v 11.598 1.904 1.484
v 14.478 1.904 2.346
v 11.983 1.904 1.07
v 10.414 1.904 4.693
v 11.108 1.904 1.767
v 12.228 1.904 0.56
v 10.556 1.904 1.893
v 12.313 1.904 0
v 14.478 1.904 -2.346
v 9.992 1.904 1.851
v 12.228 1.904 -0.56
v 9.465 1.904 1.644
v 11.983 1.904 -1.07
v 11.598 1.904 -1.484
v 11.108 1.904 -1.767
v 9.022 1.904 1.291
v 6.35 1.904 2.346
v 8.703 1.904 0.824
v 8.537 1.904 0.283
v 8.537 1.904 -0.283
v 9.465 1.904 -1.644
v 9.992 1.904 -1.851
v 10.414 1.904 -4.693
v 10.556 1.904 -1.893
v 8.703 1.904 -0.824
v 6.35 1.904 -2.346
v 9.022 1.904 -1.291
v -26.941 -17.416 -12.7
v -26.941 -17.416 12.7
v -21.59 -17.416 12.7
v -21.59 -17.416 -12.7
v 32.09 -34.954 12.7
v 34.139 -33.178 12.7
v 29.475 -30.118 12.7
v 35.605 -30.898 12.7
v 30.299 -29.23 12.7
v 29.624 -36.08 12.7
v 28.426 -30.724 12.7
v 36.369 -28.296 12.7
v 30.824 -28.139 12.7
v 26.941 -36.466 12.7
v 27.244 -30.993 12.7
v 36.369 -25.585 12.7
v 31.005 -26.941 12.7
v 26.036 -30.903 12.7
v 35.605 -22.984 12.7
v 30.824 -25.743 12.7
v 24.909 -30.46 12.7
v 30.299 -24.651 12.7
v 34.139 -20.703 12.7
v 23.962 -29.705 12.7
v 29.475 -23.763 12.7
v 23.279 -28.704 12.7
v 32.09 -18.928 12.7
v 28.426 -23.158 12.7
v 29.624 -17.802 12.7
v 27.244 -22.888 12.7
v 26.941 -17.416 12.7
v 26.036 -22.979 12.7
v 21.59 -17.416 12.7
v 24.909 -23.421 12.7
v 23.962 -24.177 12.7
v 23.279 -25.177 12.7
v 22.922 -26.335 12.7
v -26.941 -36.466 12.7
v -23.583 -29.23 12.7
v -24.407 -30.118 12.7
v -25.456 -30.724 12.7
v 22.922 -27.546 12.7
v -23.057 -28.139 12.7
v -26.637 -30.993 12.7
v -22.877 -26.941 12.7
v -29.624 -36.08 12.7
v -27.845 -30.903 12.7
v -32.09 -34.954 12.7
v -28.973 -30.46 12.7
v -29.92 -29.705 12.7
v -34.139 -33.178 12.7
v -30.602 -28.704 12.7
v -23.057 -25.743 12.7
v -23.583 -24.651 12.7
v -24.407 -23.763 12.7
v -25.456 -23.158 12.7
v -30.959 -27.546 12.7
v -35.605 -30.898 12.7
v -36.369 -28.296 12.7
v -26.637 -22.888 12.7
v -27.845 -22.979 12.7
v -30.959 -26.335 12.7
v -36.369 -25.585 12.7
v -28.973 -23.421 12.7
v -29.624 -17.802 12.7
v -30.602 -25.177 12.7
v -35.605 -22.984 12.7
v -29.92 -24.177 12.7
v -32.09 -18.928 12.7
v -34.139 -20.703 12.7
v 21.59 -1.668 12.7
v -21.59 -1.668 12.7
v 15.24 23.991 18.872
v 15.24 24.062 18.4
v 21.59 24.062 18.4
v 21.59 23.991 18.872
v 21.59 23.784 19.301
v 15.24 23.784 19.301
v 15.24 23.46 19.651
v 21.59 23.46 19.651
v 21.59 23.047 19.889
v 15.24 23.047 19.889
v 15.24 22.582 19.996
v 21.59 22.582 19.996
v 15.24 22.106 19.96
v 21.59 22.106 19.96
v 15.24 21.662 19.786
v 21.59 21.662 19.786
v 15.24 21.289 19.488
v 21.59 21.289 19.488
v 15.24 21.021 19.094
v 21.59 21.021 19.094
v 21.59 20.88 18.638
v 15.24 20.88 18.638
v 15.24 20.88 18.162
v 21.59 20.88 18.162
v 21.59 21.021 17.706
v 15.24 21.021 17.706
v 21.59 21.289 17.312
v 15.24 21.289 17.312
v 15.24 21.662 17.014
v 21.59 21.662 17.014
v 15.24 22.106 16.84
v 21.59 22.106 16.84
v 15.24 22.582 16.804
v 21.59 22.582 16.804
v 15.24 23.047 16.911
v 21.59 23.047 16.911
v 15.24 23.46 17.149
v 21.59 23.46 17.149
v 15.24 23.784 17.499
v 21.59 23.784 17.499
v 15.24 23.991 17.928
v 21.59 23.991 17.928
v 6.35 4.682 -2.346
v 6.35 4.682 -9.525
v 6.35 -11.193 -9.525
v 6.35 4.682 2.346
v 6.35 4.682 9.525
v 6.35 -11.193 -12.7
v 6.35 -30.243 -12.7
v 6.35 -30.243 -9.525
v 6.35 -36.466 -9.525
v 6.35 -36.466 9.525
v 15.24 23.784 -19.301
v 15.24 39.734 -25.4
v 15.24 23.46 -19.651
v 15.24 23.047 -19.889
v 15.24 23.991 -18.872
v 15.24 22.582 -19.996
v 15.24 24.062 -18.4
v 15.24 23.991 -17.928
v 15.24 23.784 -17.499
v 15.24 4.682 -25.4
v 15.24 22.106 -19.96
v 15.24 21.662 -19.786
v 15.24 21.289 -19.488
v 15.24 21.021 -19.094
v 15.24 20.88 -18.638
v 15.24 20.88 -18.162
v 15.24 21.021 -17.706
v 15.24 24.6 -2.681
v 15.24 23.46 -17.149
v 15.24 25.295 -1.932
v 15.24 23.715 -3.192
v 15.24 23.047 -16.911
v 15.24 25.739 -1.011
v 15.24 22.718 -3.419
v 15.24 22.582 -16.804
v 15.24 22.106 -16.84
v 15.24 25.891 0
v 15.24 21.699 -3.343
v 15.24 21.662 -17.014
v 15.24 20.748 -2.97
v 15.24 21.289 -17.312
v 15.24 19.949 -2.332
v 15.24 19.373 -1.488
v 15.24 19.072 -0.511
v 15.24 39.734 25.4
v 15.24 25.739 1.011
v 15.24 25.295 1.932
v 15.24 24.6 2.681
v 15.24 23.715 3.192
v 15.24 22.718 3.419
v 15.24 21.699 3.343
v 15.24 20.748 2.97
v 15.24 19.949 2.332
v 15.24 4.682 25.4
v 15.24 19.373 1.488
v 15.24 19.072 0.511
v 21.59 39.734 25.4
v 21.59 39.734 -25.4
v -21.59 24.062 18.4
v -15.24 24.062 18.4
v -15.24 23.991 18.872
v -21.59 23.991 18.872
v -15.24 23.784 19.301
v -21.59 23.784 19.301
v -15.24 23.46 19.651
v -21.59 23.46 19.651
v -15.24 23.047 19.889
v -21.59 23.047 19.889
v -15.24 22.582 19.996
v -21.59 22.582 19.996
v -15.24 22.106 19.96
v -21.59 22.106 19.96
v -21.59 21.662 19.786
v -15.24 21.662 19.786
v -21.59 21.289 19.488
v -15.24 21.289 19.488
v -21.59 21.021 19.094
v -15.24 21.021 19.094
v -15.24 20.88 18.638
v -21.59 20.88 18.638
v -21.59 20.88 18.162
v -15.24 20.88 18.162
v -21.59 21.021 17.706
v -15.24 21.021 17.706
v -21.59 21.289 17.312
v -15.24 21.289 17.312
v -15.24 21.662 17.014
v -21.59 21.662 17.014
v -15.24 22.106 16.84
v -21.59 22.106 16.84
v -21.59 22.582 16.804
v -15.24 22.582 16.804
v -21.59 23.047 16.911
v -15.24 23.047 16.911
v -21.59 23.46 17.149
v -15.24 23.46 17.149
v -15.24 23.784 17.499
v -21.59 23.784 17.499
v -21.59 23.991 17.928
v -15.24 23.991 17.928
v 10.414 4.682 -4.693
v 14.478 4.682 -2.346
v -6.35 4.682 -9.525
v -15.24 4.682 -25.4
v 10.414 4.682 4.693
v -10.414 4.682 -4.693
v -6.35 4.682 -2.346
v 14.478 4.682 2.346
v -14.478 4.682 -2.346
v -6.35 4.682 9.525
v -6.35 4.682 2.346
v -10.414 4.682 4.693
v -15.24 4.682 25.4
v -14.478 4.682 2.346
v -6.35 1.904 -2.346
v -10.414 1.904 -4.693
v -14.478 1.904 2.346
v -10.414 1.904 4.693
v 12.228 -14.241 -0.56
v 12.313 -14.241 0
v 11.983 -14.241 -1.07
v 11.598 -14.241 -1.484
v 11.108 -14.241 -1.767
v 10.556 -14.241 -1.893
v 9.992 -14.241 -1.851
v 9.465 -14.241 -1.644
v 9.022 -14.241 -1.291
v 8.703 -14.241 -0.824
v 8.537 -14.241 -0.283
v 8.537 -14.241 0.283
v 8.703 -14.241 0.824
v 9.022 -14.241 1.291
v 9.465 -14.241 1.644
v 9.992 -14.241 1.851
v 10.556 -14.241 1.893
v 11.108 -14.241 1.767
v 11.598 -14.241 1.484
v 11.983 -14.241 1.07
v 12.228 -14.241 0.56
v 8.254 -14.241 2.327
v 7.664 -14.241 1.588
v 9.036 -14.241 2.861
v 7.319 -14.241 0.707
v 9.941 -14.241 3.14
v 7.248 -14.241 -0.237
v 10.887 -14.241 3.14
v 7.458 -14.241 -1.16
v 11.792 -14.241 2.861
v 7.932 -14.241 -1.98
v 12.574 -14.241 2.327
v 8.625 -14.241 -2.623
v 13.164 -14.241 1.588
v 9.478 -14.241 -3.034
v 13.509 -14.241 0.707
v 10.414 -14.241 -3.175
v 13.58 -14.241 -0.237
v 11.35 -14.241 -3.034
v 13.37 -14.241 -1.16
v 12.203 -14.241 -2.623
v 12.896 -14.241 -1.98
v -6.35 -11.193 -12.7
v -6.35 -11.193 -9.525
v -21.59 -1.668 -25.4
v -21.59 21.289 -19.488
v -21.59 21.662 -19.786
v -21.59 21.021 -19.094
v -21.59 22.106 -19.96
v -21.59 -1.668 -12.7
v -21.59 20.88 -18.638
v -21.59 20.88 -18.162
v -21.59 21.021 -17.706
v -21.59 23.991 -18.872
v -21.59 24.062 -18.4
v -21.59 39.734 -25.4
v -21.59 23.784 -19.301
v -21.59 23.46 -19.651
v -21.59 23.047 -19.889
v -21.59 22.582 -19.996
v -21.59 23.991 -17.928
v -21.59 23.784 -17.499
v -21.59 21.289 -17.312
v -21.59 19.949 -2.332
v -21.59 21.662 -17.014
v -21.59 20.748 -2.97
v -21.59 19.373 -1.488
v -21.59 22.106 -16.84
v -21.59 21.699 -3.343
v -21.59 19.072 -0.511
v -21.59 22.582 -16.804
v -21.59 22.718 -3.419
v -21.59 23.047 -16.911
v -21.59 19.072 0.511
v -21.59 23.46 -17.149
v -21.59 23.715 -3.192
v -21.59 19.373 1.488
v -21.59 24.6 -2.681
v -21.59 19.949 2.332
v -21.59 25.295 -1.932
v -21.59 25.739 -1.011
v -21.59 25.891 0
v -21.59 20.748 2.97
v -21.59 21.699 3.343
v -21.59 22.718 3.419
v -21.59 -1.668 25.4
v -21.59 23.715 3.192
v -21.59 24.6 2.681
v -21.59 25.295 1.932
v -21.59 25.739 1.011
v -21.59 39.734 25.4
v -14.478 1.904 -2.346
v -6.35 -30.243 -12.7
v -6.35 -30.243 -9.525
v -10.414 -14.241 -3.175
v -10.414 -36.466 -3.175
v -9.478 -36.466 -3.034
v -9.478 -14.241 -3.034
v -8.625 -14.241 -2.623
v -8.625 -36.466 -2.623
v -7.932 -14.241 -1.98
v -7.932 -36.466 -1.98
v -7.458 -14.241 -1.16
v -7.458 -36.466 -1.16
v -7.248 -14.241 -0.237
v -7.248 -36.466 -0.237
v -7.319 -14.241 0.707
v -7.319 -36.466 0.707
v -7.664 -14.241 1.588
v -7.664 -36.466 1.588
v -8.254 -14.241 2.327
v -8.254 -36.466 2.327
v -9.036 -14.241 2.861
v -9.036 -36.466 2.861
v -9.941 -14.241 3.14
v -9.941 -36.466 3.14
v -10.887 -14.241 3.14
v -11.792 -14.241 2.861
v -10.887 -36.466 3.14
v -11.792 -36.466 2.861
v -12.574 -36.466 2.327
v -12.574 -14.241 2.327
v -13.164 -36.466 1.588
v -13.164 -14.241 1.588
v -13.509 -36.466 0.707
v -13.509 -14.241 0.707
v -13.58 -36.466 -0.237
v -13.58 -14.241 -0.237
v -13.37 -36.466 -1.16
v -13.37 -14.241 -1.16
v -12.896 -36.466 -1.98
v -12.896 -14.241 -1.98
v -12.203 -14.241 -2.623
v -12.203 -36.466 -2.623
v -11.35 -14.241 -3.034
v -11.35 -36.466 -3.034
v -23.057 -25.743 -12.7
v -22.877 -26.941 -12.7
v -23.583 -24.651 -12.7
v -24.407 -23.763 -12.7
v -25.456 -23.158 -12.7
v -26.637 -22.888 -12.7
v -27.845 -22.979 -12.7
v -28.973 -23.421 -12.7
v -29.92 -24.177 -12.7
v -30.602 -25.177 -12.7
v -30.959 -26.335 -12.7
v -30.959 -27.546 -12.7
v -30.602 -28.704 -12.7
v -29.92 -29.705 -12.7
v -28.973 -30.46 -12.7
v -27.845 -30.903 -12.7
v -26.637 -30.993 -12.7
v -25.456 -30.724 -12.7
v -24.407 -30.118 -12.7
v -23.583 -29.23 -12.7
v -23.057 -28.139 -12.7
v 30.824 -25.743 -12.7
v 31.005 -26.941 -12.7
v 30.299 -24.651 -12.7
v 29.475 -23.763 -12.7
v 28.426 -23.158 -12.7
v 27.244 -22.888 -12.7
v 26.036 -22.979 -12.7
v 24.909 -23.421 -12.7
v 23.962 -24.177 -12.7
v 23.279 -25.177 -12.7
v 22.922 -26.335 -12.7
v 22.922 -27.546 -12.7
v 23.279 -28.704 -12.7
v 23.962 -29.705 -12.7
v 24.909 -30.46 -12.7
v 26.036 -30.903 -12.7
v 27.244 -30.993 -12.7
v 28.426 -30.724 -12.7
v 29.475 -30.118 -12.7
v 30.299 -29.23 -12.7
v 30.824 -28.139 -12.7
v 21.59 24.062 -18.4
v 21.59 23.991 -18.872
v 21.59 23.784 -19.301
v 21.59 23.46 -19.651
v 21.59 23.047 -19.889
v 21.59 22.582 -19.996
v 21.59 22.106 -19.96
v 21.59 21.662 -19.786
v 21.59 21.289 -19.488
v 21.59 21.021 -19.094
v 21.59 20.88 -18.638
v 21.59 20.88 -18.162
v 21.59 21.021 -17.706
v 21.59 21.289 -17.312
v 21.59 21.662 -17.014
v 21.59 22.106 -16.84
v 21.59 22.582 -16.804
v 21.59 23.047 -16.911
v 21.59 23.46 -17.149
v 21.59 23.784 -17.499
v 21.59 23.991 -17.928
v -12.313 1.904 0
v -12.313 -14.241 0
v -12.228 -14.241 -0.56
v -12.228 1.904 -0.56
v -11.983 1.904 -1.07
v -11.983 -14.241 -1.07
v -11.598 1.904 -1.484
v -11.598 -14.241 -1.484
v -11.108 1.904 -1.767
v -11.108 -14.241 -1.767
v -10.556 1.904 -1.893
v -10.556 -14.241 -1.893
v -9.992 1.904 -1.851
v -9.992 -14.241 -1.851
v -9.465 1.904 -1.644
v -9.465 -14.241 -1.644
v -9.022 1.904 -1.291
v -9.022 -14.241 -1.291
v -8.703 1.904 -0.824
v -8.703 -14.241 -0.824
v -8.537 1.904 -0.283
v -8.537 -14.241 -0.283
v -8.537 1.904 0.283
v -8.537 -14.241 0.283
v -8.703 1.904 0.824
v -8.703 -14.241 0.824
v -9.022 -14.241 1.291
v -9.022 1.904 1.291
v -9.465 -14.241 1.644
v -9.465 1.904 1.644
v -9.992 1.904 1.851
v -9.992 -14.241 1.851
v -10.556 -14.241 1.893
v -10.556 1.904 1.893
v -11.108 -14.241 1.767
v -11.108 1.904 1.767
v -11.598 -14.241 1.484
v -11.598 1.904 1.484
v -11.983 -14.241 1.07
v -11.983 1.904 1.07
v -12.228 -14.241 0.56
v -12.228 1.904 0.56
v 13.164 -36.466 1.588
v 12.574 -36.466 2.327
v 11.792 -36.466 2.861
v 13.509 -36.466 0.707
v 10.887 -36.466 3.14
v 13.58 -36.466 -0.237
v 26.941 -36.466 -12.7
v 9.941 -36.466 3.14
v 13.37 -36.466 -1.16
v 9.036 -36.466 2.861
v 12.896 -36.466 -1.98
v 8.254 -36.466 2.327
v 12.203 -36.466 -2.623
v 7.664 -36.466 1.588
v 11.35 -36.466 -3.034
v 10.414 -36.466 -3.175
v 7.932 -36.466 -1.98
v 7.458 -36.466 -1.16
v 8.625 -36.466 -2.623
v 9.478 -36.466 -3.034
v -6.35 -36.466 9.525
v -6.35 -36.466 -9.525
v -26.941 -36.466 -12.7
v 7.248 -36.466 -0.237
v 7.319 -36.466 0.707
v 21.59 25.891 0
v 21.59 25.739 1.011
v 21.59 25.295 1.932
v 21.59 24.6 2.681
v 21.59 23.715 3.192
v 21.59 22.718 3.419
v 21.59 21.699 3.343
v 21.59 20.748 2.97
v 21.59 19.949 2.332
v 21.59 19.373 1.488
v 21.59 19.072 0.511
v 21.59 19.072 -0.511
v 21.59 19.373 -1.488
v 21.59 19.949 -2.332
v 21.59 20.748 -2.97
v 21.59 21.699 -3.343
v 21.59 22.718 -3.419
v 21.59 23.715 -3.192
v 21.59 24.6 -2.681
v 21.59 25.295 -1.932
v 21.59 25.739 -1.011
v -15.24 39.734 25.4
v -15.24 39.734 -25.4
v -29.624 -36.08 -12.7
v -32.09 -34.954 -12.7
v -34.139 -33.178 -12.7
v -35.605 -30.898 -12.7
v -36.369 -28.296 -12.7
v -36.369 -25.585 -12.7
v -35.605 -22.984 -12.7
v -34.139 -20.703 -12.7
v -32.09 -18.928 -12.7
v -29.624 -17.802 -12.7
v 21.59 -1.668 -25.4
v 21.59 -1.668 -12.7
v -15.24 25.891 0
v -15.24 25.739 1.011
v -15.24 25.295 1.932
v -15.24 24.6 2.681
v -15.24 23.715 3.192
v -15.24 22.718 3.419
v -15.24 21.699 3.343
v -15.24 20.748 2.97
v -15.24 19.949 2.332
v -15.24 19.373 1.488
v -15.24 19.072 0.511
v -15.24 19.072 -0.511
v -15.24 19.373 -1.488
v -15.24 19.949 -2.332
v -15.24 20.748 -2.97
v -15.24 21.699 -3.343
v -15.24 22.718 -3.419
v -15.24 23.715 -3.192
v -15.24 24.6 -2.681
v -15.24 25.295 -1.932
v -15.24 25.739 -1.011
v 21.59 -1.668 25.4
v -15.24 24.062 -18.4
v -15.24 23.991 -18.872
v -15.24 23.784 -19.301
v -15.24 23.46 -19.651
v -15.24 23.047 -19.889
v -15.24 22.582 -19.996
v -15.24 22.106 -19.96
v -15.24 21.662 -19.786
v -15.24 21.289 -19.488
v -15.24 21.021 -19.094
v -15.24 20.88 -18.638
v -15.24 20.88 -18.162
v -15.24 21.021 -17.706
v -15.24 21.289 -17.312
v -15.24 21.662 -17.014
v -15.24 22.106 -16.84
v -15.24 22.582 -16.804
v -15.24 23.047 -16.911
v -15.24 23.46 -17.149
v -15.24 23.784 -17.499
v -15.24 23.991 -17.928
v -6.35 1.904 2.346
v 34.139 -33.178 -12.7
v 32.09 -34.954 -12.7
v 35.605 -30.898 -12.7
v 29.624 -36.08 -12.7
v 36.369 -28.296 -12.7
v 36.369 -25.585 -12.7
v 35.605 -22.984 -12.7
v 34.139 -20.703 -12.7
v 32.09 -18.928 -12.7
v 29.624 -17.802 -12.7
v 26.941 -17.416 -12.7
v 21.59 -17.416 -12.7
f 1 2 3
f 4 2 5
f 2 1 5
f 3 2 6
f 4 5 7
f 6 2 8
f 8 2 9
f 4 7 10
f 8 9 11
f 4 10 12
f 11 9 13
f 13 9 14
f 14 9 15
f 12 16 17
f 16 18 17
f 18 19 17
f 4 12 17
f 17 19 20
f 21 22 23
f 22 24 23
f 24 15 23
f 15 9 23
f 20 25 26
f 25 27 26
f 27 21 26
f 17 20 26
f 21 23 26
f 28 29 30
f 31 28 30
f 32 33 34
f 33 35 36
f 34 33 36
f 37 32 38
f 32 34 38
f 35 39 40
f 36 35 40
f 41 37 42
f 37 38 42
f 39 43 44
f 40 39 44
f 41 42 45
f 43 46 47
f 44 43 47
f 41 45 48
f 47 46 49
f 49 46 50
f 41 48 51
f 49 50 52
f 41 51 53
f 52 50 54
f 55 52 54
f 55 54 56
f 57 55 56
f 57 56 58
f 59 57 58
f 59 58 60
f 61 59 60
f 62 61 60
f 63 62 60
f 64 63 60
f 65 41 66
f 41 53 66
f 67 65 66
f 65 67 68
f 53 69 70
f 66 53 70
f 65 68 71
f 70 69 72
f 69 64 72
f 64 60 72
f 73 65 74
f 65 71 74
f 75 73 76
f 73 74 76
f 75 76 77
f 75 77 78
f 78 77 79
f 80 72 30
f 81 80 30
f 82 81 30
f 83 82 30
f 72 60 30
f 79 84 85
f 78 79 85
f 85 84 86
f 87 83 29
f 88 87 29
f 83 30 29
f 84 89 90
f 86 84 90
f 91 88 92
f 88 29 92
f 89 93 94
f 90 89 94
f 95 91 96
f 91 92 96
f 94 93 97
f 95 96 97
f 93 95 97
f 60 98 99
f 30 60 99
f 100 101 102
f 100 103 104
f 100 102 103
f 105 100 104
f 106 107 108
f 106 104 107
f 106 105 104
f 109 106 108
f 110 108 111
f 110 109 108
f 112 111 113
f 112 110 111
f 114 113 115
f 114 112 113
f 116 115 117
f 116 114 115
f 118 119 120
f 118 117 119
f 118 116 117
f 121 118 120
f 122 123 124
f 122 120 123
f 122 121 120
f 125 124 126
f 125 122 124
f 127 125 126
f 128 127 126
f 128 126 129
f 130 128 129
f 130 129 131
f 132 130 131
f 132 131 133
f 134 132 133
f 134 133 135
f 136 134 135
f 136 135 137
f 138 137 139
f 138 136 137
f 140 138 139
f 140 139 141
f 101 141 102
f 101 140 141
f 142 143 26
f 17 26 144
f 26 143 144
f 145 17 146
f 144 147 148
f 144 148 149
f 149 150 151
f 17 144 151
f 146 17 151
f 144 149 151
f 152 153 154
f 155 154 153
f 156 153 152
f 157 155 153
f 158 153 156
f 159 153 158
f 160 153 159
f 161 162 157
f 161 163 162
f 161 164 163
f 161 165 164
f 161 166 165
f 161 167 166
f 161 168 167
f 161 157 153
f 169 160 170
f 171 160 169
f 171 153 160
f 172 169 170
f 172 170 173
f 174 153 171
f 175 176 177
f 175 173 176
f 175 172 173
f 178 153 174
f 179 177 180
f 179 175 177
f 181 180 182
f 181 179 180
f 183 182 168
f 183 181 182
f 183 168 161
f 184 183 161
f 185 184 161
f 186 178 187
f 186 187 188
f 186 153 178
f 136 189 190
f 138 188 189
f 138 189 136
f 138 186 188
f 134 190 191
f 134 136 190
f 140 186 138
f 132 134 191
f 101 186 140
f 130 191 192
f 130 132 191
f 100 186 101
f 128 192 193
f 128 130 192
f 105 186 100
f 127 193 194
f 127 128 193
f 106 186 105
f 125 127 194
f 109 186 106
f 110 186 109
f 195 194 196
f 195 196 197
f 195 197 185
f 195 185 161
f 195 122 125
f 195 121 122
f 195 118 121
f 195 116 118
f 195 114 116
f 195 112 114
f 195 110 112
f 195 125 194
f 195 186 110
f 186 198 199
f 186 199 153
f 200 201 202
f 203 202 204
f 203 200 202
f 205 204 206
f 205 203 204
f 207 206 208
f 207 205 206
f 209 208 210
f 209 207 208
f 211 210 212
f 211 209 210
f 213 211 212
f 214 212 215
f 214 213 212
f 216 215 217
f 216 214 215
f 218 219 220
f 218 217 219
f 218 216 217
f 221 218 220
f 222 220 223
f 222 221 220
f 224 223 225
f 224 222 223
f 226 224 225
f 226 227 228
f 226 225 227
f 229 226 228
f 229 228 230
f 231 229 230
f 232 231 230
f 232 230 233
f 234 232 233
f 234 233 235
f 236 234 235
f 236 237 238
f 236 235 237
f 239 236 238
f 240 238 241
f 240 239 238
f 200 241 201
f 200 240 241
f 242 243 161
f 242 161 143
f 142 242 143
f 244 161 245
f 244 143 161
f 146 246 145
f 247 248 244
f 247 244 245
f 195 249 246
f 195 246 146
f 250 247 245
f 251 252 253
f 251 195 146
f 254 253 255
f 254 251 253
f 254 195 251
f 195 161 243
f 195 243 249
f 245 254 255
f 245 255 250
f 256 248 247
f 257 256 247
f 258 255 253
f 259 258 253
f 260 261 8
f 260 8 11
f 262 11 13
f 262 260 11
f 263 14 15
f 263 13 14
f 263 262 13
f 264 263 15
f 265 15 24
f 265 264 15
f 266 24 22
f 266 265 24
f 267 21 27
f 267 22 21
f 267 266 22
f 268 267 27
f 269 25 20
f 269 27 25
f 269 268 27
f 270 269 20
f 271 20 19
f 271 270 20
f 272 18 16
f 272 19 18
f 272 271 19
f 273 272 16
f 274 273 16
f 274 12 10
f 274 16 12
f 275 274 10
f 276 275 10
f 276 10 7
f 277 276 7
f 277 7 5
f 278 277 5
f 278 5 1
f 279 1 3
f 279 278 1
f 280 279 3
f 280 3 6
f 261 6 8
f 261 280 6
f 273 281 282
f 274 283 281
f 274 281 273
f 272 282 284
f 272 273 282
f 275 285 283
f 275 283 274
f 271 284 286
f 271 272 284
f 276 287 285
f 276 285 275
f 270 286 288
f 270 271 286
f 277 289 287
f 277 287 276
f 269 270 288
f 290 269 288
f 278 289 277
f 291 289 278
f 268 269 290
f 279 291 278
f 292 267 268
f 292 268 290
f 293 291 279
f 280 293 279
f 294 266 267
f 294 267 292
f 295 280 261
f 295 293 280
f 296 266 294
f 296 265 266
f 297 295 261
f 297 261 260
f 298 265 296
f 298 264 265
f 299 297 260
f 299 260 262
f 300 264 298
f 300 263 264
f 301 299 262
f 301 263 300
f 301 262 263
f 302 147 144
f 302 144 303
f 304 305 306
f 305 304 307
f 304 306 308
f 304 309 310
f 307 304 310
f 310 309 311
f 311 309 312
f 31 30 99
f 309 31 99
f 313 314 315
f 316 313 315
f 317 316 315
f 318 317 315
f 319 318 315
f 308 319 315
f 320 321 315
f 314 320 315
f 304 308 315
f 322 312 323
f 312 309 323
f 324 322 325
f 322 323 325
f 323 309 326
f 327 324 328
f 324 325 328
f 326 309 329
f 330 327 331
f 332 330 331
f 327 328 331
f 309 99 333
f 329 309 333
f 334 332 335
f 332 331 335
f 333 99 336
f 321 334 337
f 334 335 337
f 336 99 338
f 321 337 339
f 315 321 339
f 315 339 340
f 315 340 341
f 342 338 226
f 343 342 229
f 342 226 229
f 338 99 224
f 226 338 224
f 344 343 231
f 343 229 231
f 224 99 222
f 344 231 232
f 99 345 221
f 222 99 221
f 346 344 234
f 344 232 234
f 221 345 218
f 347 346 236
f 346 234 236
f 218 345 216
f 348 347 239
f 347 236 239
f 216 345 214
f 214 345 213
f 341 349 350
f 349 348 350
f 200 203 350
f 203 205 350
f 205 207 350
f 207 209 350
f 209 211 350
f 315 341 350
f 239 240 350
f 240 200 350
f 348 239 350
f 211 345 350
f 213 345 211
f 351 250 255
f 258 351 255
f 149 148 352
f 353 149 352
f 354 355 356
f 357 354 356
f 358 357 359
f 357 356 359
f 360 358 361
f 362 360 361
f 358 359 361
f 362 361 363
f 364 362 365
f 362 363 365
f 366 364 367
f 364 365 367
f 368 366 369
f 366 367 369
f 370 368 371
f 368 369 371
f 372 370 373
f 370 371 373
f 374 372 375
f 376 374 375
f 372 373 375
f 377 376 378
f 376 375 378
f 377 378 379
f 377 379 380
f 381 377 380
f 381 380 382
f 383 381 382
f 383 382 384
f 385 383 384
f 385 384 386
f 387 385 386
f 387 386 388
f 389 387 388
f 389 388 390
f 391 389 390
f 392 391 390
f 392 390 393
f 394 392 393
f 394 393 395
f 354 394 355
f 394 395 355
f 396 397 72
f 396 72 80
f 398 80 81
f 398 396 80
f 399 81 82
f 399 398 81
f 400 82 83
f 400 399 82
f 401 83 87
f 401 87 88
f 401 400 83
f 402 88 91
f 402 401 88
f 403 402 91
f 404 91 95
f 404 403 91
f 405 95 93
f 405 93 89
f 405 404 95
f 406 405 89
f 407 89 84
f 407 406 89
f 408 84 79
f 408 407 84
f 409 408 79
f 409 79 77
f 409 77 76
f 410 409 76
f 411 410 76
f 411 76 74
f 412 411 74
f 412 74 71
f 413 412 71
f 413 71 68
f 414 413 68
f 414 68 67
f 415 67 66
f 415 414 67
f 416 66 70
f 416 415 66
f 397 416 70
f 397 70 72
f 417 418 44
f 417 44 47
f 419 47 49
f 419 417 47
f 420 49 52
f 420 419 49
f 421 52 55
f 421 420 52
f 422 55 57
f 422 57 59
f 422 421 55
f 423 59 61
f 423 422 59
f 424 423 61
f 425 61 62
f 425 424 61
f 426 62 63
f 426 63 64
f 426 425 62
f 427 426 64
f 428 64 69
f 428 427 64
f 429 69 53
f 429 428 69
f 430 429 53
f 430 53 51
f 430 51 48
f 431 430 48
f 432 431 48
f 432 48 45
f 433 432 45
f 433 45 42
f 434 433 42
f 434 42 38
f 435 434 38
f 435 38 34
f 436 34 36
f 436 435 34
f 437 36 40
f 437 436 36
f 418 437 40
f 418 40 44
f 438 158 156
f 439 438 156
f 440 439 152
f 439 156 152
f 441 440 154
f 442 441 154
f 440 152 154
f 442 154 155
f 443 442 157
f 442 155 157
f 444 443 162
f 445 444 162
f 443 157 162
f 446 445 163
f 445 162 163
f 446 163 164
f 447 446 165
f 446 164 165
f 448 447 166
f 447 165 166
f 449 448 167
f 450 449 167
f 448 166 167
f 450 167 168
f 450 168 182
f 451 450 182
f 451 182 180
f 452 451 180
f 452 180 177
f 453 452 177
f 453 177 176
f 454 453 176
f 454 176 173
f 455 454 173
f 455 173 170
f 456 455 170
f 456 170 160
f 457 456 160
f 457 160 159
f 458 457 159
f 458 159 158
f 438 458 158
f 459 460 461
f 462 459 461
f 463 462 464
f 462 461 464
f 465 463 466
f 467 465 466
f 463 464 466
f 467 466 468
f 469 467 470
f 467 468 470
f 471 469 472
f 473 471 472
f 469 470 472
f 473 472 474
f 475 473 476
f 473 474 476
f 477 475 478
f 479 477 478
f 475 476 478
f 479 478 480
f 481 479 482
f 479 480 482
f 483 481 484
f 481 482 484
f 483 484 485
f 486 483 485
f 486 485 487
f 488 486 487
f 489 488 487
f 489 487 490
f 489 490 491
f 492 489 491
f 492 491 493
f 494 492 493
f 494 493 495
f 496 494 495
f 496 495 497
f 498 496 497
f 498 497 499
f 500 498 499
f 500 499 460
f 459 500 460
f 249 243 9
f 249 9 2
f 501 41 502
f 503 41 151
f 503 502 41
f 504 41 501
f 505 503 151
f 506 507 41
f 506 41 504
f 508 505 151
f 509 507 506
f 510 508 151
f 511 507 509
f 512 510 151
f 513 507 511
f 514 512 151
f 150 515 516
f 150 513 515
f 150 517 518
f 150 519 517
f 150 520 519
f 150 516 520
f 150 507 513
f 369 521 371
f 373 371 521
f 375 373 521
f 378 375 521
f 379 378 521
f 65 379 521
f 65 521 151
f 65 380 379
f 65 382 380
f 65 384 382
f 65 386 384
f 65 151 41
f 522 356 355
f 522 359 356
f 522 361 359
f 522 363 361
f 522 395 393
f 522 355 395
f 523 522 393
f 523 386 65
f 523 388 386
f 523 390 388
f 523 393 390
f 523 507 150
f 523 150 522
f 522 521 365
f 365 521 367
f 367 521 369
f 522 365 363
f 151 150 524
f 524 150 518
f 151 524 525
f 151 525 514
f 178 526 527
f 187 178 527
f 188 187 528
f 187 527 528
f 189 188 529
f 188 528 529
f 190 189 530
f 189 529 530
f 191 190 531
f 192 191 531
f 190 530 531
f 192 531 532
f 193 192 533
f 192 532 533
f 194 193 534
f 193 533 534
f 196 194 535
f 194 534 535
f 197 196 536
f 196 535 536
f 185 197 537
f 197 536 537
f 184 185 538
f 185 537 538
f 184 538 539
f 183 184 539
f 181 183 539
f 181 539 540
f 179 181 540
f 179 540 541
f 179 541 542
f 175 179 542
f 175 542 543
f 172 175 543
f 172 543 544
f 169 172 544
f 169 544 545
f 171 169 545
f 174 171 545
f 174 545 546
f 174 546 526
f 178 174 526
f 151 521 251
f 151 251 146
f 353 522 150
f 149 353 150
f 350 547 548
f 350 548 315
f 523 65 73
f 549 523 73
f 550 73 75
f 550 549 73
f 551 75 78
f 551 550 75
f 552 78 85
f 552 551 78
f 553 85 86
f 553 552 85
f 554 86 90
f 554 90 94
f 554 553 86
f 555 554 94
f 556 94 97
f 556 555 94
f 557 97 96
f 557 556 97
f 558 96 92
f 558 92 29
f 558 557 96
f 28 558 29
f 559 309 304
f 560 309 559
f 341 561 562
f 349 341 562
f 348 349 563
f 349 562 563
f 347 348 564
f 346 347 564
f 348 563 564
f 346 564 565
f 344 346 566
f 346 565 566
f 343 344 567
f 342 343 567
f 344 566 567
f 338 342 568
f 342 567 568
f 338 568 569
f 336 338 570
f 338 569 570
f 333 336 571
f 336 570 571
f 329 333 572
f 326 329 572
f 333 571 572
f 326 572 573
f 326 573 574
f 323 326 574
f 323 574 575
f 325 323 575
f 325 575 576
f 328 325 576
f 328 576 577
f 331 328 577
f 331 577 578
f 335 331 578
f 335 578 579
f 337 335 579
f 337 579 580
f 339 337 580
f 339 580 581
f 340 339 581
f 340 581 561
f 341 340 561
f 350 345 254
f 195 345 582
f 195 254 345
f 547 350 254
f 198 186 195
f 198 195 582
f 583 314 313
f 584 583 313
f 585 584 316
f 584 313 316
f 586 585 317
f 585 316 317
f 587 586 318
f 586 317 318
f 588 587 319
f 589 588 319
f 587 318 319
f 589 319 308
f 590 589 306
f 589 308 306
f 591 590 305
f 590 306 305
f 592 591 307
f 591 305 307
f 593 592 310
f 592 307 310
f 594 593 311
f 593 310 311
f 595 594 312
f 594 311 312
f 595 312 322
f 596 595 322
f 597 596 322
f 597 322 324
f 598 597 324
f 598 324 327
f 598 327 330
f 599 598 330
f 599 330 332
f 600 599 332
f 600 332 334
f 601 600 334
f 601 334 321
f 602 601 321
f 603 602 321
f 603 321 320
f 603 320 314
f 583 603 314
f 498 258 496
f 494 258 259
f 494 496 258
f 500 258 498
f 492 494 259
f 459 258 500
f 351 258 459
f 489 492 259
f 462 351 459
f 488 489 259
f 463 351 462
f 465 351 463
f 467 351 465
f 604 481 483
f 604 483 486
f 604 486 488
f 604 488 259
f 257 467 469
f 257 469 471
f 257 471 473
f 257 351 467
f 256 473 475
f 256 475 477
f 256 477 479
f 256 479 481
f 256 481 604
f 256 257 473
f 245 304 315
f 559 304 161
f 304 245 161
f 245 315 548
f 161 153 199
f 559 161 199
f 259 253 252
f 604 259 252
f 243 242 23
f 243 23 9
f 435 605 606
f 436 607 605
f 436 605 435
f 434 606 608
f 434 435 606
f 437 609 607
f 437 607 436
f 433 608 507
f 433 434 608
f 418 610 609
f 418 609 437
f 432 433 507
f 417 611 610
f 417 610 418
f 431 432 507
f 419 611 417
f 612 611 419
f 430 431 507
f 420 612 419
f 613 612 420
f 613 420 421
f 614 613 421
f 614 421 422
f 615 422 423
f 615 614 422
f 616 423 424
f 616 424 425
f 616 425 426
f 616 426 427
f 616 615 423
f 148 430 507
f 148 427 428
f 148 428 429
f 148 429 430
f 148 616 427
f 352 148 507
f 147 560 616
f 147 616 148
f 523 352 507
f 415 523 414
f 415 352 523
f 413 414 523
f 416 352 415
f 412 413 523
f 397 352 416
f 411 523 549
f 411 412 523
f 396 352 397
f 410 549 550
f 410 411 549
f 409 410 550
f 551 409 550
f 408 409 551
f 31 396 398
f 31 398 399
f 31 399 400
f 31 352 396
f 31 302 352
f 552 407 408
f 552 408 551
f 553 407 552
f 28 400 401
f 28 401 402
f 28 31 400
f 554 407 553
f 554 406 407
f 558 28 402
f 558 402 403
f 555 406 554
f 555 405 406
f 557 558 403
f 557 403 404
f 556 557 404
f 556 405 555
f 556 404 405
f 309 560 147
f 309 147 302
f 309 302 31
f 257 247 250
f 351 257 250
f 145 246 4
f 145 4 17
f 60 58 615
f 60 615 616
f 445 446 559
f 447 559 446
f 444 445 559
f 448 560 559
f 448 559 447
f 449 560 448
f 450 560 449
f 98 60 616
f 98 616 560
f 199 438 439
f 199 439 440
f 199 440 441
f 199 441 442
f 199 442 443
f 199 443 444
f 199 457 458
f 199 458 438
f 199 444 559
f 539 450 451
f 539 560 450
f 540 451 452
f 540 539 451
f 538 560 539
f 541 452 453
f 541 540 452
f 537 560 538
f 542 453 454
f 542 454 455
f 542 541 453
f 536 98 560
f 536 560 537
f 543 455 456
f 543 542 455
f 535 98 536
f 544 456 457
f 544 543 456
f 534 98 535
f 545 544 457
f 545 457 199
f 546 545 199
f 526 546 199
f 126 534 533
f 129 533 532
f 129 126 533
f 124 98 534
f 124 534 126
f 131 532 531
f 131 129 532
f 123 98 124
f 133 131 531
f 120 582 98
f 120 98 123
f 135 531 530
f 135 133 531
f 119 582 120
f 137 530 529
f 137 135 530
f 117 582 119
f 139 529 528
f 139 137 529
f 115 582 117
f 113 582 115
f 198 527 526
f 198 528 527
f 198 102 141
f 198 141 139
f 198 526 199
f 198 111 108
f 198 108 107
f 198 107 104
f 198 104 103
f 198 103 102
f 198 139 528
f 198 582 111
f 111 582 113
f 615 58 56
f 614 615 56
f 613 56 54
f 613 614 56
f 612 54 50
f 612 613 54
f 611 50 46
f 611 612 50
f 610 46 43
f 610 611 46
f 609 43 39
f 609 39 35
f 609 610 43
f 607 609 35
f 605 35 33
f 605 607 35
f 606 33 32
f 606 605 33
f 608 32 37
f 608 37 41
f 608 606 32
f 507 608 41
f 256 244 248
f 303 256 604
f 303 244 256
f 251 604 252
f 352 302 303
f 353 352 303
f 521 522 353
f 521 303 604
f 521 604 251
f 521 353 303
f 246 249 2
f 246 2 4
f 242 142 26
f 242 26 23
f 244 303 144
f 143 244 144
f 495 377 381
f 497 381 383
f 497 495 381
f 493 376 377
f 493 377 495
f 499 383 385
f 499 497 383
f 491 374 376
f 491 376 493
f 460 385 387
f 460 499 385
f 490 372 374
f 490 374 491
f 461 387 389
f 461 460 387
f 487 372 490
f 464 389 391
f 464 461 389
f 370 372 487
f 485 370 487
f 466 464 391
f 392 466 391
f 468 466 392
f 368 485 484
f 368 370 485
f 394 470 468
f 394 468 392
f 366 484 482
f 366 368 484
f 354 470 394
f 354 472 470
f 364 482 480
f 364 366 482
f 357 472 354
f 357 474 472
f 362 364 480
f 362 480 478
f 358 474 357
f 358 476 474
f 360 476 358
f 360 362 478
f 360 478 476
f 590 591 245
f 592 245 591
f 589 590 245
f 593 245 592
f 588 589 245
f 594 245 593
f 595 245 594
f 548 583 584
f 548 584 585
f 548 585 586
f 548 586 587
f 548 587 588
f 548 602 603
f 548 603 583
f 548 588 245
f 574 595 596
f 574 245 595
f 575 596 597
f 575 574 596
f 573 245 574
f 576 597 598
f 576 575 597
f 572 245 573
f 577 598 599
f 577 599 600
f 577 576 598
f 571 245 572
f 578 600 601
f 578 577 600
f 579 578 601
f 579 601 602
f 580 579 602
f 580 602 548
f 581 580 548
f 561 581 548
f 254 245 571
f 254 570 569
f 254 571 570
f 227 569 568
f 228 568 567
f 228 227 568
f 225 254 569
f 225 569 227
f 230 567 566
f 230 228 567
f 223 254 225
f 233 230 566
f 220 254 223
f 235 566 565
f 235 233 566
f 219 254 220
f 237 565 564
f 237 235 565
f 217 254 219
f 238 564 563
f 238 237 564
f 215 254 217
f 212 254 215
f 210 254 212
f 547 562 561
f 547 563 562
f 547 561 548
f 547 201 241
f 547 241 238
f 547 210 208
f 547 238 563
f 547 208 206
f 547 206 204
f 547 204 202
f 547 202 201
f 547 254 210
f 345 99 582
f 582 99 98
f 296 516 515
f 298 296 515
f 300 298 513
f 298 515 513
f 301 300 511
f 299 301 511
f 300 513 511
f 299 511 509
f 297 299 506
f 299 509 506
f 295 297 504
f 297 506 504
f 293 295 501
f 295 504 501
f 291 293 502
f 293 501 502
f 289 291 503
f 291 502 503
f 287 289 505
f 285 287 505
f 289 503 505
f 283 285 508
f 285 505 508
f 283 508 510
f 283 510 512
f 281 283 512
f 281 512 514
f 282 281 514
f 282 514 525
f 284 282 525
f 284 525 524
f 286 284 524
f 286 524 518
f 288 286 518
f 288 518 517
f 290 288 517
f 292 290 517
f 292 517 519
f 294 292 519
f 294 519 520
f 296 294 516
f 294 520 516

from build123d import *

# Parameters (mm, degrees)
BOSS_EXTRUDE1_DEPTH      = 12.7
BOSS_EXTRUDE1_DEPTH_BACK = 12.7
SKETCH1_R                = 4.064
SKETCH9_W                = 30.48
SKETCH9_H                = 35.052
CUT_EXTRUDE6_DEPTH       = 60.613097773
BOSS_EXTRUDE3_DEPTH      = 12.7
SKETCH11_W               = 5.350768363
SKETCH11_H               = 57.15
CUT_EXTRUDE7_DEPTH       = 75.08914513
SKETCH12_W               = 12.7
SKETCH12_H               = 19.05
CUT_EXTRUDE8_DEPTH       = 89.211973463
SKETCH14_R               = 1.6
CUT_EXTRUDE9_DEPTH       = 75.795998583
SKETCH15_R               = 3.429
CUT_EXTRUDE10_DEPTH      = 75.795998583
CUT_EXTRUDE11_DEPTH      = 2.778125
F_6_CLEARANCE_HOLE1_D    = 3.7973
SKETCH23_R               = 3.175
CUT_EXTRUDE12_DEPTH      = 22.225
CUT_EXTRUDE13_REACH      = 68.032
SKETCH24_W               = 12.7
SKETCH24_H               = 19.05


with BuildPart() as part:
    # Sketch1 → Boss-Extrude1 (new, two sides: drawn at the far end of the back side and taken through both)
    with BuildSketch(Plane.XY.offset(-BOSS_EXTRUDE1_DEPTH_BACK)):
        with BuildLine():
            Line((-26.940768363, -17.415768363), (-26.940768363, 39.734231637))
            Line((-26.940768363, 39.734231637), (26.940768363, 39.734231637))
            Line((26.940768363, 39.734231637), (26.940768363, -17.415768363))
            ThreePointArc((26.940768363, -17.415768363), (36.465768363, -26.940768363), (26.940768363, -36.465768363))
            Line((26.940768363, -36.465768363), (-26.940768363, -36.465768363))
            ThreePointArc((-26.940768363, -36.465768363), (-36.465768363, -26.940768363), (-26.940768363, -17.415768363))
        make_face()
        with Locations((-26.940768363, -26.940768363)):
            Circle(SKETCH1_R, mode=Mode.SUBTRACT)
        with Locations((26.940768363, -26.940768363)):
            Circle(SKETCH1_R, mode=Mode.SUBTRACT)
    extrude(amount=BOSS_EXTRUDE1_DEPTH + BOSS_EXTRUDE1_DEPTH_BACK)

    # Sketch9 → Cut-Extrude6 (cut, through all)
    with BuildSketch(Plane.XY.offset(12.7)):
        with Locations((0, 22.208231637)):
            Rectangle(SKETCH9_W, SKETCH9_H)
    extrude(amount=-CUT_EXTRUDE6_DEPTH, mode=Mode.SUBTRACT)

    # Sketch10 → Boss-Extrude3 (add)
    with BuildSketch(Plane.XY.offset(12.7)):
        Polygon((-26.940768363, 39.734231637), (-26.940768363, -1.667768363), (26.940768363, -1.667768363), (26.940768363, 39.734231637), (15.24, 39.734231637), (15.24, 4.682231637), (-15.24, 4.682231637), (-15.24, 39.734231637), align=None)
    boss_extrude3 = extrude(amount=BOSS_EXTRUDE3_DEPTH)

    # Mirror4: Boss-Extrude3 across plane
    add(boss_extrude3.mirror(Plane.XY))

    # Sketch11 → Cut-Extrude7 (cut, through all)
    with BuildSketch(Plane.XY.offset(25.4)):
        with Locations((-24.265384181, 11.159231637)):
            Rectangle(SKETCH11_W, SKETCH11_H)
    cut_extrude7 = extrude(amount=-CUT_EXTRUDE7_DEPTH, mode=Mode.SUBTRACT)

    # Mirror5: Cut-Extrude7 across plane
    add(cut_extrude7.mirror(Plane(origin=(0, 0, 0), x_dir=(0, 0, 1), z_dir=(1, 0, 0))), mode=Mode.SUBTRACT)

    # Sketch12 → Cut-Extrude8 (cut, through all)
    with BuildSketch(Plane.XZ.offset(36.465768363)):
        Rectangle(SKETCH12_W, SKETCH12_H)
    extrude(amount=-CUT_EXTRUDE8_DEPTH, mode=Mode.SUBTRACT)

    # Sketch14 → Cut-Extrude9 (cut, through all)
    with BuildSketch(Plane.ZY.offset(21.59)):
        with Locations((-18.4, 22.462231637)):
            Circle(SKETCH14_R)
    cut_extrude9 = extrude(amount=-CUT_EXTRUDE9_DEPTH, mode=Mode.SUBTRACT)

    # Mirror6: Cut-Extrude9 across plane
    add(cut_extrude9.mirror(Plane.XY), mode=Mode.SUBTRACT)

    # Sketch15 → Cut-Extrude10 (cut, through all)
    with BuildSketch(Plane(origin=(21.59, 0, 0), x_dir=(0, 0, -1), z_dir=(1, 0, 0))):
        with Locations((0, 22.462231637)):
            Circle(SKETCH15_R)
    extrude(amount=-CUT_EXTRUDE10_DEPTH, mode=Mode.SUBTRACT)

    # Sketch18 → Cut-Extrude11 (cut)
    with BuildSketch(Plane(origin=(0, 4.682231637, 0), x_dir=(1, 0, 0), z_dir=(0, 1, 0))):
        Polygon((-6.35, 2.346351494), (-10.414, 4.692702988), (-14.478, 2.346351494), (-14.478, -2.346351494), (-10.414, -4.692702988), (-6.35, -2.346351494), align=None)
    cut_extrude11 = extrude(amount=-CUT_EXTRUDE11_DEPTH, mode=Mode.SUBTRACT)

    # Mirror7: Cut-Extrude11 across plane
    add(cut_extrude11.mirror(Plane(origin=(0, 0, 0), x_dir=(0, 0, 1), z_dir=(1, 0, 0))), mode=Mode.SUBTRACT)

    # #6 Clearance Hole1 (through all)
    with Locations(Plane(origin=(0, 1.904106637, 0), x_dir=(1, 0, 0), z_dir=(0, 1, 0))):
        with Locations((-10.414, 0)):
            f_6_clearance_hole1 = Hole(F_6_CLEARANCE_HOLE1_D / 2)

    # Mirror8: #6 Clearance Hole1 across plane
    add(f_6_clearance_hole1.mirror(Plane(origin=(0, 0, 0), x_dir=(0, 0, 1), z_dir=(1, 0, 0))), mode=Mode.SUBTRACT)

    # Sketch23 → Cut-Extrude12 (cut)
    with BuildSketch(Plane.XZ.offset(36.465768363)):
        with Locations((-10.414, 0)):
            Circle(SKETCH23_R)
        with Locations((10.414, 0)):
            Circle(SKETCH23_R)
    extrude(amount=-CUT_EXTRUDE12_DEPTH, mode=Mode.SUBTRACT)

    # Sketch24 → Cut-Extrude13 (cut, up to next)
    with BuildSketch(Plane(origin=(0, 0, -12.7), x_dir=(-1, 0, 0), z_dir=(0, 0, -1)), mode=Mode.PRIVATE) as cut_extrude13_sk1:
        with Locations((0, -20.717768363)):
            Rectangle(SKETCH24_W, SKETCH24_H)
    cut_extrude13_tool1 = extrude(cut_extrude13_sk1.sketch, amount=-CUT_EXTRUDE13_REACH, mode=Mode.PRIVATE) & part.part
    add(cut_extrude13_tool1.solids().sort_by_distance((0, -20.717768, -12.7))[0], mode=Mode.SUBTRACT)


solid = part.part
